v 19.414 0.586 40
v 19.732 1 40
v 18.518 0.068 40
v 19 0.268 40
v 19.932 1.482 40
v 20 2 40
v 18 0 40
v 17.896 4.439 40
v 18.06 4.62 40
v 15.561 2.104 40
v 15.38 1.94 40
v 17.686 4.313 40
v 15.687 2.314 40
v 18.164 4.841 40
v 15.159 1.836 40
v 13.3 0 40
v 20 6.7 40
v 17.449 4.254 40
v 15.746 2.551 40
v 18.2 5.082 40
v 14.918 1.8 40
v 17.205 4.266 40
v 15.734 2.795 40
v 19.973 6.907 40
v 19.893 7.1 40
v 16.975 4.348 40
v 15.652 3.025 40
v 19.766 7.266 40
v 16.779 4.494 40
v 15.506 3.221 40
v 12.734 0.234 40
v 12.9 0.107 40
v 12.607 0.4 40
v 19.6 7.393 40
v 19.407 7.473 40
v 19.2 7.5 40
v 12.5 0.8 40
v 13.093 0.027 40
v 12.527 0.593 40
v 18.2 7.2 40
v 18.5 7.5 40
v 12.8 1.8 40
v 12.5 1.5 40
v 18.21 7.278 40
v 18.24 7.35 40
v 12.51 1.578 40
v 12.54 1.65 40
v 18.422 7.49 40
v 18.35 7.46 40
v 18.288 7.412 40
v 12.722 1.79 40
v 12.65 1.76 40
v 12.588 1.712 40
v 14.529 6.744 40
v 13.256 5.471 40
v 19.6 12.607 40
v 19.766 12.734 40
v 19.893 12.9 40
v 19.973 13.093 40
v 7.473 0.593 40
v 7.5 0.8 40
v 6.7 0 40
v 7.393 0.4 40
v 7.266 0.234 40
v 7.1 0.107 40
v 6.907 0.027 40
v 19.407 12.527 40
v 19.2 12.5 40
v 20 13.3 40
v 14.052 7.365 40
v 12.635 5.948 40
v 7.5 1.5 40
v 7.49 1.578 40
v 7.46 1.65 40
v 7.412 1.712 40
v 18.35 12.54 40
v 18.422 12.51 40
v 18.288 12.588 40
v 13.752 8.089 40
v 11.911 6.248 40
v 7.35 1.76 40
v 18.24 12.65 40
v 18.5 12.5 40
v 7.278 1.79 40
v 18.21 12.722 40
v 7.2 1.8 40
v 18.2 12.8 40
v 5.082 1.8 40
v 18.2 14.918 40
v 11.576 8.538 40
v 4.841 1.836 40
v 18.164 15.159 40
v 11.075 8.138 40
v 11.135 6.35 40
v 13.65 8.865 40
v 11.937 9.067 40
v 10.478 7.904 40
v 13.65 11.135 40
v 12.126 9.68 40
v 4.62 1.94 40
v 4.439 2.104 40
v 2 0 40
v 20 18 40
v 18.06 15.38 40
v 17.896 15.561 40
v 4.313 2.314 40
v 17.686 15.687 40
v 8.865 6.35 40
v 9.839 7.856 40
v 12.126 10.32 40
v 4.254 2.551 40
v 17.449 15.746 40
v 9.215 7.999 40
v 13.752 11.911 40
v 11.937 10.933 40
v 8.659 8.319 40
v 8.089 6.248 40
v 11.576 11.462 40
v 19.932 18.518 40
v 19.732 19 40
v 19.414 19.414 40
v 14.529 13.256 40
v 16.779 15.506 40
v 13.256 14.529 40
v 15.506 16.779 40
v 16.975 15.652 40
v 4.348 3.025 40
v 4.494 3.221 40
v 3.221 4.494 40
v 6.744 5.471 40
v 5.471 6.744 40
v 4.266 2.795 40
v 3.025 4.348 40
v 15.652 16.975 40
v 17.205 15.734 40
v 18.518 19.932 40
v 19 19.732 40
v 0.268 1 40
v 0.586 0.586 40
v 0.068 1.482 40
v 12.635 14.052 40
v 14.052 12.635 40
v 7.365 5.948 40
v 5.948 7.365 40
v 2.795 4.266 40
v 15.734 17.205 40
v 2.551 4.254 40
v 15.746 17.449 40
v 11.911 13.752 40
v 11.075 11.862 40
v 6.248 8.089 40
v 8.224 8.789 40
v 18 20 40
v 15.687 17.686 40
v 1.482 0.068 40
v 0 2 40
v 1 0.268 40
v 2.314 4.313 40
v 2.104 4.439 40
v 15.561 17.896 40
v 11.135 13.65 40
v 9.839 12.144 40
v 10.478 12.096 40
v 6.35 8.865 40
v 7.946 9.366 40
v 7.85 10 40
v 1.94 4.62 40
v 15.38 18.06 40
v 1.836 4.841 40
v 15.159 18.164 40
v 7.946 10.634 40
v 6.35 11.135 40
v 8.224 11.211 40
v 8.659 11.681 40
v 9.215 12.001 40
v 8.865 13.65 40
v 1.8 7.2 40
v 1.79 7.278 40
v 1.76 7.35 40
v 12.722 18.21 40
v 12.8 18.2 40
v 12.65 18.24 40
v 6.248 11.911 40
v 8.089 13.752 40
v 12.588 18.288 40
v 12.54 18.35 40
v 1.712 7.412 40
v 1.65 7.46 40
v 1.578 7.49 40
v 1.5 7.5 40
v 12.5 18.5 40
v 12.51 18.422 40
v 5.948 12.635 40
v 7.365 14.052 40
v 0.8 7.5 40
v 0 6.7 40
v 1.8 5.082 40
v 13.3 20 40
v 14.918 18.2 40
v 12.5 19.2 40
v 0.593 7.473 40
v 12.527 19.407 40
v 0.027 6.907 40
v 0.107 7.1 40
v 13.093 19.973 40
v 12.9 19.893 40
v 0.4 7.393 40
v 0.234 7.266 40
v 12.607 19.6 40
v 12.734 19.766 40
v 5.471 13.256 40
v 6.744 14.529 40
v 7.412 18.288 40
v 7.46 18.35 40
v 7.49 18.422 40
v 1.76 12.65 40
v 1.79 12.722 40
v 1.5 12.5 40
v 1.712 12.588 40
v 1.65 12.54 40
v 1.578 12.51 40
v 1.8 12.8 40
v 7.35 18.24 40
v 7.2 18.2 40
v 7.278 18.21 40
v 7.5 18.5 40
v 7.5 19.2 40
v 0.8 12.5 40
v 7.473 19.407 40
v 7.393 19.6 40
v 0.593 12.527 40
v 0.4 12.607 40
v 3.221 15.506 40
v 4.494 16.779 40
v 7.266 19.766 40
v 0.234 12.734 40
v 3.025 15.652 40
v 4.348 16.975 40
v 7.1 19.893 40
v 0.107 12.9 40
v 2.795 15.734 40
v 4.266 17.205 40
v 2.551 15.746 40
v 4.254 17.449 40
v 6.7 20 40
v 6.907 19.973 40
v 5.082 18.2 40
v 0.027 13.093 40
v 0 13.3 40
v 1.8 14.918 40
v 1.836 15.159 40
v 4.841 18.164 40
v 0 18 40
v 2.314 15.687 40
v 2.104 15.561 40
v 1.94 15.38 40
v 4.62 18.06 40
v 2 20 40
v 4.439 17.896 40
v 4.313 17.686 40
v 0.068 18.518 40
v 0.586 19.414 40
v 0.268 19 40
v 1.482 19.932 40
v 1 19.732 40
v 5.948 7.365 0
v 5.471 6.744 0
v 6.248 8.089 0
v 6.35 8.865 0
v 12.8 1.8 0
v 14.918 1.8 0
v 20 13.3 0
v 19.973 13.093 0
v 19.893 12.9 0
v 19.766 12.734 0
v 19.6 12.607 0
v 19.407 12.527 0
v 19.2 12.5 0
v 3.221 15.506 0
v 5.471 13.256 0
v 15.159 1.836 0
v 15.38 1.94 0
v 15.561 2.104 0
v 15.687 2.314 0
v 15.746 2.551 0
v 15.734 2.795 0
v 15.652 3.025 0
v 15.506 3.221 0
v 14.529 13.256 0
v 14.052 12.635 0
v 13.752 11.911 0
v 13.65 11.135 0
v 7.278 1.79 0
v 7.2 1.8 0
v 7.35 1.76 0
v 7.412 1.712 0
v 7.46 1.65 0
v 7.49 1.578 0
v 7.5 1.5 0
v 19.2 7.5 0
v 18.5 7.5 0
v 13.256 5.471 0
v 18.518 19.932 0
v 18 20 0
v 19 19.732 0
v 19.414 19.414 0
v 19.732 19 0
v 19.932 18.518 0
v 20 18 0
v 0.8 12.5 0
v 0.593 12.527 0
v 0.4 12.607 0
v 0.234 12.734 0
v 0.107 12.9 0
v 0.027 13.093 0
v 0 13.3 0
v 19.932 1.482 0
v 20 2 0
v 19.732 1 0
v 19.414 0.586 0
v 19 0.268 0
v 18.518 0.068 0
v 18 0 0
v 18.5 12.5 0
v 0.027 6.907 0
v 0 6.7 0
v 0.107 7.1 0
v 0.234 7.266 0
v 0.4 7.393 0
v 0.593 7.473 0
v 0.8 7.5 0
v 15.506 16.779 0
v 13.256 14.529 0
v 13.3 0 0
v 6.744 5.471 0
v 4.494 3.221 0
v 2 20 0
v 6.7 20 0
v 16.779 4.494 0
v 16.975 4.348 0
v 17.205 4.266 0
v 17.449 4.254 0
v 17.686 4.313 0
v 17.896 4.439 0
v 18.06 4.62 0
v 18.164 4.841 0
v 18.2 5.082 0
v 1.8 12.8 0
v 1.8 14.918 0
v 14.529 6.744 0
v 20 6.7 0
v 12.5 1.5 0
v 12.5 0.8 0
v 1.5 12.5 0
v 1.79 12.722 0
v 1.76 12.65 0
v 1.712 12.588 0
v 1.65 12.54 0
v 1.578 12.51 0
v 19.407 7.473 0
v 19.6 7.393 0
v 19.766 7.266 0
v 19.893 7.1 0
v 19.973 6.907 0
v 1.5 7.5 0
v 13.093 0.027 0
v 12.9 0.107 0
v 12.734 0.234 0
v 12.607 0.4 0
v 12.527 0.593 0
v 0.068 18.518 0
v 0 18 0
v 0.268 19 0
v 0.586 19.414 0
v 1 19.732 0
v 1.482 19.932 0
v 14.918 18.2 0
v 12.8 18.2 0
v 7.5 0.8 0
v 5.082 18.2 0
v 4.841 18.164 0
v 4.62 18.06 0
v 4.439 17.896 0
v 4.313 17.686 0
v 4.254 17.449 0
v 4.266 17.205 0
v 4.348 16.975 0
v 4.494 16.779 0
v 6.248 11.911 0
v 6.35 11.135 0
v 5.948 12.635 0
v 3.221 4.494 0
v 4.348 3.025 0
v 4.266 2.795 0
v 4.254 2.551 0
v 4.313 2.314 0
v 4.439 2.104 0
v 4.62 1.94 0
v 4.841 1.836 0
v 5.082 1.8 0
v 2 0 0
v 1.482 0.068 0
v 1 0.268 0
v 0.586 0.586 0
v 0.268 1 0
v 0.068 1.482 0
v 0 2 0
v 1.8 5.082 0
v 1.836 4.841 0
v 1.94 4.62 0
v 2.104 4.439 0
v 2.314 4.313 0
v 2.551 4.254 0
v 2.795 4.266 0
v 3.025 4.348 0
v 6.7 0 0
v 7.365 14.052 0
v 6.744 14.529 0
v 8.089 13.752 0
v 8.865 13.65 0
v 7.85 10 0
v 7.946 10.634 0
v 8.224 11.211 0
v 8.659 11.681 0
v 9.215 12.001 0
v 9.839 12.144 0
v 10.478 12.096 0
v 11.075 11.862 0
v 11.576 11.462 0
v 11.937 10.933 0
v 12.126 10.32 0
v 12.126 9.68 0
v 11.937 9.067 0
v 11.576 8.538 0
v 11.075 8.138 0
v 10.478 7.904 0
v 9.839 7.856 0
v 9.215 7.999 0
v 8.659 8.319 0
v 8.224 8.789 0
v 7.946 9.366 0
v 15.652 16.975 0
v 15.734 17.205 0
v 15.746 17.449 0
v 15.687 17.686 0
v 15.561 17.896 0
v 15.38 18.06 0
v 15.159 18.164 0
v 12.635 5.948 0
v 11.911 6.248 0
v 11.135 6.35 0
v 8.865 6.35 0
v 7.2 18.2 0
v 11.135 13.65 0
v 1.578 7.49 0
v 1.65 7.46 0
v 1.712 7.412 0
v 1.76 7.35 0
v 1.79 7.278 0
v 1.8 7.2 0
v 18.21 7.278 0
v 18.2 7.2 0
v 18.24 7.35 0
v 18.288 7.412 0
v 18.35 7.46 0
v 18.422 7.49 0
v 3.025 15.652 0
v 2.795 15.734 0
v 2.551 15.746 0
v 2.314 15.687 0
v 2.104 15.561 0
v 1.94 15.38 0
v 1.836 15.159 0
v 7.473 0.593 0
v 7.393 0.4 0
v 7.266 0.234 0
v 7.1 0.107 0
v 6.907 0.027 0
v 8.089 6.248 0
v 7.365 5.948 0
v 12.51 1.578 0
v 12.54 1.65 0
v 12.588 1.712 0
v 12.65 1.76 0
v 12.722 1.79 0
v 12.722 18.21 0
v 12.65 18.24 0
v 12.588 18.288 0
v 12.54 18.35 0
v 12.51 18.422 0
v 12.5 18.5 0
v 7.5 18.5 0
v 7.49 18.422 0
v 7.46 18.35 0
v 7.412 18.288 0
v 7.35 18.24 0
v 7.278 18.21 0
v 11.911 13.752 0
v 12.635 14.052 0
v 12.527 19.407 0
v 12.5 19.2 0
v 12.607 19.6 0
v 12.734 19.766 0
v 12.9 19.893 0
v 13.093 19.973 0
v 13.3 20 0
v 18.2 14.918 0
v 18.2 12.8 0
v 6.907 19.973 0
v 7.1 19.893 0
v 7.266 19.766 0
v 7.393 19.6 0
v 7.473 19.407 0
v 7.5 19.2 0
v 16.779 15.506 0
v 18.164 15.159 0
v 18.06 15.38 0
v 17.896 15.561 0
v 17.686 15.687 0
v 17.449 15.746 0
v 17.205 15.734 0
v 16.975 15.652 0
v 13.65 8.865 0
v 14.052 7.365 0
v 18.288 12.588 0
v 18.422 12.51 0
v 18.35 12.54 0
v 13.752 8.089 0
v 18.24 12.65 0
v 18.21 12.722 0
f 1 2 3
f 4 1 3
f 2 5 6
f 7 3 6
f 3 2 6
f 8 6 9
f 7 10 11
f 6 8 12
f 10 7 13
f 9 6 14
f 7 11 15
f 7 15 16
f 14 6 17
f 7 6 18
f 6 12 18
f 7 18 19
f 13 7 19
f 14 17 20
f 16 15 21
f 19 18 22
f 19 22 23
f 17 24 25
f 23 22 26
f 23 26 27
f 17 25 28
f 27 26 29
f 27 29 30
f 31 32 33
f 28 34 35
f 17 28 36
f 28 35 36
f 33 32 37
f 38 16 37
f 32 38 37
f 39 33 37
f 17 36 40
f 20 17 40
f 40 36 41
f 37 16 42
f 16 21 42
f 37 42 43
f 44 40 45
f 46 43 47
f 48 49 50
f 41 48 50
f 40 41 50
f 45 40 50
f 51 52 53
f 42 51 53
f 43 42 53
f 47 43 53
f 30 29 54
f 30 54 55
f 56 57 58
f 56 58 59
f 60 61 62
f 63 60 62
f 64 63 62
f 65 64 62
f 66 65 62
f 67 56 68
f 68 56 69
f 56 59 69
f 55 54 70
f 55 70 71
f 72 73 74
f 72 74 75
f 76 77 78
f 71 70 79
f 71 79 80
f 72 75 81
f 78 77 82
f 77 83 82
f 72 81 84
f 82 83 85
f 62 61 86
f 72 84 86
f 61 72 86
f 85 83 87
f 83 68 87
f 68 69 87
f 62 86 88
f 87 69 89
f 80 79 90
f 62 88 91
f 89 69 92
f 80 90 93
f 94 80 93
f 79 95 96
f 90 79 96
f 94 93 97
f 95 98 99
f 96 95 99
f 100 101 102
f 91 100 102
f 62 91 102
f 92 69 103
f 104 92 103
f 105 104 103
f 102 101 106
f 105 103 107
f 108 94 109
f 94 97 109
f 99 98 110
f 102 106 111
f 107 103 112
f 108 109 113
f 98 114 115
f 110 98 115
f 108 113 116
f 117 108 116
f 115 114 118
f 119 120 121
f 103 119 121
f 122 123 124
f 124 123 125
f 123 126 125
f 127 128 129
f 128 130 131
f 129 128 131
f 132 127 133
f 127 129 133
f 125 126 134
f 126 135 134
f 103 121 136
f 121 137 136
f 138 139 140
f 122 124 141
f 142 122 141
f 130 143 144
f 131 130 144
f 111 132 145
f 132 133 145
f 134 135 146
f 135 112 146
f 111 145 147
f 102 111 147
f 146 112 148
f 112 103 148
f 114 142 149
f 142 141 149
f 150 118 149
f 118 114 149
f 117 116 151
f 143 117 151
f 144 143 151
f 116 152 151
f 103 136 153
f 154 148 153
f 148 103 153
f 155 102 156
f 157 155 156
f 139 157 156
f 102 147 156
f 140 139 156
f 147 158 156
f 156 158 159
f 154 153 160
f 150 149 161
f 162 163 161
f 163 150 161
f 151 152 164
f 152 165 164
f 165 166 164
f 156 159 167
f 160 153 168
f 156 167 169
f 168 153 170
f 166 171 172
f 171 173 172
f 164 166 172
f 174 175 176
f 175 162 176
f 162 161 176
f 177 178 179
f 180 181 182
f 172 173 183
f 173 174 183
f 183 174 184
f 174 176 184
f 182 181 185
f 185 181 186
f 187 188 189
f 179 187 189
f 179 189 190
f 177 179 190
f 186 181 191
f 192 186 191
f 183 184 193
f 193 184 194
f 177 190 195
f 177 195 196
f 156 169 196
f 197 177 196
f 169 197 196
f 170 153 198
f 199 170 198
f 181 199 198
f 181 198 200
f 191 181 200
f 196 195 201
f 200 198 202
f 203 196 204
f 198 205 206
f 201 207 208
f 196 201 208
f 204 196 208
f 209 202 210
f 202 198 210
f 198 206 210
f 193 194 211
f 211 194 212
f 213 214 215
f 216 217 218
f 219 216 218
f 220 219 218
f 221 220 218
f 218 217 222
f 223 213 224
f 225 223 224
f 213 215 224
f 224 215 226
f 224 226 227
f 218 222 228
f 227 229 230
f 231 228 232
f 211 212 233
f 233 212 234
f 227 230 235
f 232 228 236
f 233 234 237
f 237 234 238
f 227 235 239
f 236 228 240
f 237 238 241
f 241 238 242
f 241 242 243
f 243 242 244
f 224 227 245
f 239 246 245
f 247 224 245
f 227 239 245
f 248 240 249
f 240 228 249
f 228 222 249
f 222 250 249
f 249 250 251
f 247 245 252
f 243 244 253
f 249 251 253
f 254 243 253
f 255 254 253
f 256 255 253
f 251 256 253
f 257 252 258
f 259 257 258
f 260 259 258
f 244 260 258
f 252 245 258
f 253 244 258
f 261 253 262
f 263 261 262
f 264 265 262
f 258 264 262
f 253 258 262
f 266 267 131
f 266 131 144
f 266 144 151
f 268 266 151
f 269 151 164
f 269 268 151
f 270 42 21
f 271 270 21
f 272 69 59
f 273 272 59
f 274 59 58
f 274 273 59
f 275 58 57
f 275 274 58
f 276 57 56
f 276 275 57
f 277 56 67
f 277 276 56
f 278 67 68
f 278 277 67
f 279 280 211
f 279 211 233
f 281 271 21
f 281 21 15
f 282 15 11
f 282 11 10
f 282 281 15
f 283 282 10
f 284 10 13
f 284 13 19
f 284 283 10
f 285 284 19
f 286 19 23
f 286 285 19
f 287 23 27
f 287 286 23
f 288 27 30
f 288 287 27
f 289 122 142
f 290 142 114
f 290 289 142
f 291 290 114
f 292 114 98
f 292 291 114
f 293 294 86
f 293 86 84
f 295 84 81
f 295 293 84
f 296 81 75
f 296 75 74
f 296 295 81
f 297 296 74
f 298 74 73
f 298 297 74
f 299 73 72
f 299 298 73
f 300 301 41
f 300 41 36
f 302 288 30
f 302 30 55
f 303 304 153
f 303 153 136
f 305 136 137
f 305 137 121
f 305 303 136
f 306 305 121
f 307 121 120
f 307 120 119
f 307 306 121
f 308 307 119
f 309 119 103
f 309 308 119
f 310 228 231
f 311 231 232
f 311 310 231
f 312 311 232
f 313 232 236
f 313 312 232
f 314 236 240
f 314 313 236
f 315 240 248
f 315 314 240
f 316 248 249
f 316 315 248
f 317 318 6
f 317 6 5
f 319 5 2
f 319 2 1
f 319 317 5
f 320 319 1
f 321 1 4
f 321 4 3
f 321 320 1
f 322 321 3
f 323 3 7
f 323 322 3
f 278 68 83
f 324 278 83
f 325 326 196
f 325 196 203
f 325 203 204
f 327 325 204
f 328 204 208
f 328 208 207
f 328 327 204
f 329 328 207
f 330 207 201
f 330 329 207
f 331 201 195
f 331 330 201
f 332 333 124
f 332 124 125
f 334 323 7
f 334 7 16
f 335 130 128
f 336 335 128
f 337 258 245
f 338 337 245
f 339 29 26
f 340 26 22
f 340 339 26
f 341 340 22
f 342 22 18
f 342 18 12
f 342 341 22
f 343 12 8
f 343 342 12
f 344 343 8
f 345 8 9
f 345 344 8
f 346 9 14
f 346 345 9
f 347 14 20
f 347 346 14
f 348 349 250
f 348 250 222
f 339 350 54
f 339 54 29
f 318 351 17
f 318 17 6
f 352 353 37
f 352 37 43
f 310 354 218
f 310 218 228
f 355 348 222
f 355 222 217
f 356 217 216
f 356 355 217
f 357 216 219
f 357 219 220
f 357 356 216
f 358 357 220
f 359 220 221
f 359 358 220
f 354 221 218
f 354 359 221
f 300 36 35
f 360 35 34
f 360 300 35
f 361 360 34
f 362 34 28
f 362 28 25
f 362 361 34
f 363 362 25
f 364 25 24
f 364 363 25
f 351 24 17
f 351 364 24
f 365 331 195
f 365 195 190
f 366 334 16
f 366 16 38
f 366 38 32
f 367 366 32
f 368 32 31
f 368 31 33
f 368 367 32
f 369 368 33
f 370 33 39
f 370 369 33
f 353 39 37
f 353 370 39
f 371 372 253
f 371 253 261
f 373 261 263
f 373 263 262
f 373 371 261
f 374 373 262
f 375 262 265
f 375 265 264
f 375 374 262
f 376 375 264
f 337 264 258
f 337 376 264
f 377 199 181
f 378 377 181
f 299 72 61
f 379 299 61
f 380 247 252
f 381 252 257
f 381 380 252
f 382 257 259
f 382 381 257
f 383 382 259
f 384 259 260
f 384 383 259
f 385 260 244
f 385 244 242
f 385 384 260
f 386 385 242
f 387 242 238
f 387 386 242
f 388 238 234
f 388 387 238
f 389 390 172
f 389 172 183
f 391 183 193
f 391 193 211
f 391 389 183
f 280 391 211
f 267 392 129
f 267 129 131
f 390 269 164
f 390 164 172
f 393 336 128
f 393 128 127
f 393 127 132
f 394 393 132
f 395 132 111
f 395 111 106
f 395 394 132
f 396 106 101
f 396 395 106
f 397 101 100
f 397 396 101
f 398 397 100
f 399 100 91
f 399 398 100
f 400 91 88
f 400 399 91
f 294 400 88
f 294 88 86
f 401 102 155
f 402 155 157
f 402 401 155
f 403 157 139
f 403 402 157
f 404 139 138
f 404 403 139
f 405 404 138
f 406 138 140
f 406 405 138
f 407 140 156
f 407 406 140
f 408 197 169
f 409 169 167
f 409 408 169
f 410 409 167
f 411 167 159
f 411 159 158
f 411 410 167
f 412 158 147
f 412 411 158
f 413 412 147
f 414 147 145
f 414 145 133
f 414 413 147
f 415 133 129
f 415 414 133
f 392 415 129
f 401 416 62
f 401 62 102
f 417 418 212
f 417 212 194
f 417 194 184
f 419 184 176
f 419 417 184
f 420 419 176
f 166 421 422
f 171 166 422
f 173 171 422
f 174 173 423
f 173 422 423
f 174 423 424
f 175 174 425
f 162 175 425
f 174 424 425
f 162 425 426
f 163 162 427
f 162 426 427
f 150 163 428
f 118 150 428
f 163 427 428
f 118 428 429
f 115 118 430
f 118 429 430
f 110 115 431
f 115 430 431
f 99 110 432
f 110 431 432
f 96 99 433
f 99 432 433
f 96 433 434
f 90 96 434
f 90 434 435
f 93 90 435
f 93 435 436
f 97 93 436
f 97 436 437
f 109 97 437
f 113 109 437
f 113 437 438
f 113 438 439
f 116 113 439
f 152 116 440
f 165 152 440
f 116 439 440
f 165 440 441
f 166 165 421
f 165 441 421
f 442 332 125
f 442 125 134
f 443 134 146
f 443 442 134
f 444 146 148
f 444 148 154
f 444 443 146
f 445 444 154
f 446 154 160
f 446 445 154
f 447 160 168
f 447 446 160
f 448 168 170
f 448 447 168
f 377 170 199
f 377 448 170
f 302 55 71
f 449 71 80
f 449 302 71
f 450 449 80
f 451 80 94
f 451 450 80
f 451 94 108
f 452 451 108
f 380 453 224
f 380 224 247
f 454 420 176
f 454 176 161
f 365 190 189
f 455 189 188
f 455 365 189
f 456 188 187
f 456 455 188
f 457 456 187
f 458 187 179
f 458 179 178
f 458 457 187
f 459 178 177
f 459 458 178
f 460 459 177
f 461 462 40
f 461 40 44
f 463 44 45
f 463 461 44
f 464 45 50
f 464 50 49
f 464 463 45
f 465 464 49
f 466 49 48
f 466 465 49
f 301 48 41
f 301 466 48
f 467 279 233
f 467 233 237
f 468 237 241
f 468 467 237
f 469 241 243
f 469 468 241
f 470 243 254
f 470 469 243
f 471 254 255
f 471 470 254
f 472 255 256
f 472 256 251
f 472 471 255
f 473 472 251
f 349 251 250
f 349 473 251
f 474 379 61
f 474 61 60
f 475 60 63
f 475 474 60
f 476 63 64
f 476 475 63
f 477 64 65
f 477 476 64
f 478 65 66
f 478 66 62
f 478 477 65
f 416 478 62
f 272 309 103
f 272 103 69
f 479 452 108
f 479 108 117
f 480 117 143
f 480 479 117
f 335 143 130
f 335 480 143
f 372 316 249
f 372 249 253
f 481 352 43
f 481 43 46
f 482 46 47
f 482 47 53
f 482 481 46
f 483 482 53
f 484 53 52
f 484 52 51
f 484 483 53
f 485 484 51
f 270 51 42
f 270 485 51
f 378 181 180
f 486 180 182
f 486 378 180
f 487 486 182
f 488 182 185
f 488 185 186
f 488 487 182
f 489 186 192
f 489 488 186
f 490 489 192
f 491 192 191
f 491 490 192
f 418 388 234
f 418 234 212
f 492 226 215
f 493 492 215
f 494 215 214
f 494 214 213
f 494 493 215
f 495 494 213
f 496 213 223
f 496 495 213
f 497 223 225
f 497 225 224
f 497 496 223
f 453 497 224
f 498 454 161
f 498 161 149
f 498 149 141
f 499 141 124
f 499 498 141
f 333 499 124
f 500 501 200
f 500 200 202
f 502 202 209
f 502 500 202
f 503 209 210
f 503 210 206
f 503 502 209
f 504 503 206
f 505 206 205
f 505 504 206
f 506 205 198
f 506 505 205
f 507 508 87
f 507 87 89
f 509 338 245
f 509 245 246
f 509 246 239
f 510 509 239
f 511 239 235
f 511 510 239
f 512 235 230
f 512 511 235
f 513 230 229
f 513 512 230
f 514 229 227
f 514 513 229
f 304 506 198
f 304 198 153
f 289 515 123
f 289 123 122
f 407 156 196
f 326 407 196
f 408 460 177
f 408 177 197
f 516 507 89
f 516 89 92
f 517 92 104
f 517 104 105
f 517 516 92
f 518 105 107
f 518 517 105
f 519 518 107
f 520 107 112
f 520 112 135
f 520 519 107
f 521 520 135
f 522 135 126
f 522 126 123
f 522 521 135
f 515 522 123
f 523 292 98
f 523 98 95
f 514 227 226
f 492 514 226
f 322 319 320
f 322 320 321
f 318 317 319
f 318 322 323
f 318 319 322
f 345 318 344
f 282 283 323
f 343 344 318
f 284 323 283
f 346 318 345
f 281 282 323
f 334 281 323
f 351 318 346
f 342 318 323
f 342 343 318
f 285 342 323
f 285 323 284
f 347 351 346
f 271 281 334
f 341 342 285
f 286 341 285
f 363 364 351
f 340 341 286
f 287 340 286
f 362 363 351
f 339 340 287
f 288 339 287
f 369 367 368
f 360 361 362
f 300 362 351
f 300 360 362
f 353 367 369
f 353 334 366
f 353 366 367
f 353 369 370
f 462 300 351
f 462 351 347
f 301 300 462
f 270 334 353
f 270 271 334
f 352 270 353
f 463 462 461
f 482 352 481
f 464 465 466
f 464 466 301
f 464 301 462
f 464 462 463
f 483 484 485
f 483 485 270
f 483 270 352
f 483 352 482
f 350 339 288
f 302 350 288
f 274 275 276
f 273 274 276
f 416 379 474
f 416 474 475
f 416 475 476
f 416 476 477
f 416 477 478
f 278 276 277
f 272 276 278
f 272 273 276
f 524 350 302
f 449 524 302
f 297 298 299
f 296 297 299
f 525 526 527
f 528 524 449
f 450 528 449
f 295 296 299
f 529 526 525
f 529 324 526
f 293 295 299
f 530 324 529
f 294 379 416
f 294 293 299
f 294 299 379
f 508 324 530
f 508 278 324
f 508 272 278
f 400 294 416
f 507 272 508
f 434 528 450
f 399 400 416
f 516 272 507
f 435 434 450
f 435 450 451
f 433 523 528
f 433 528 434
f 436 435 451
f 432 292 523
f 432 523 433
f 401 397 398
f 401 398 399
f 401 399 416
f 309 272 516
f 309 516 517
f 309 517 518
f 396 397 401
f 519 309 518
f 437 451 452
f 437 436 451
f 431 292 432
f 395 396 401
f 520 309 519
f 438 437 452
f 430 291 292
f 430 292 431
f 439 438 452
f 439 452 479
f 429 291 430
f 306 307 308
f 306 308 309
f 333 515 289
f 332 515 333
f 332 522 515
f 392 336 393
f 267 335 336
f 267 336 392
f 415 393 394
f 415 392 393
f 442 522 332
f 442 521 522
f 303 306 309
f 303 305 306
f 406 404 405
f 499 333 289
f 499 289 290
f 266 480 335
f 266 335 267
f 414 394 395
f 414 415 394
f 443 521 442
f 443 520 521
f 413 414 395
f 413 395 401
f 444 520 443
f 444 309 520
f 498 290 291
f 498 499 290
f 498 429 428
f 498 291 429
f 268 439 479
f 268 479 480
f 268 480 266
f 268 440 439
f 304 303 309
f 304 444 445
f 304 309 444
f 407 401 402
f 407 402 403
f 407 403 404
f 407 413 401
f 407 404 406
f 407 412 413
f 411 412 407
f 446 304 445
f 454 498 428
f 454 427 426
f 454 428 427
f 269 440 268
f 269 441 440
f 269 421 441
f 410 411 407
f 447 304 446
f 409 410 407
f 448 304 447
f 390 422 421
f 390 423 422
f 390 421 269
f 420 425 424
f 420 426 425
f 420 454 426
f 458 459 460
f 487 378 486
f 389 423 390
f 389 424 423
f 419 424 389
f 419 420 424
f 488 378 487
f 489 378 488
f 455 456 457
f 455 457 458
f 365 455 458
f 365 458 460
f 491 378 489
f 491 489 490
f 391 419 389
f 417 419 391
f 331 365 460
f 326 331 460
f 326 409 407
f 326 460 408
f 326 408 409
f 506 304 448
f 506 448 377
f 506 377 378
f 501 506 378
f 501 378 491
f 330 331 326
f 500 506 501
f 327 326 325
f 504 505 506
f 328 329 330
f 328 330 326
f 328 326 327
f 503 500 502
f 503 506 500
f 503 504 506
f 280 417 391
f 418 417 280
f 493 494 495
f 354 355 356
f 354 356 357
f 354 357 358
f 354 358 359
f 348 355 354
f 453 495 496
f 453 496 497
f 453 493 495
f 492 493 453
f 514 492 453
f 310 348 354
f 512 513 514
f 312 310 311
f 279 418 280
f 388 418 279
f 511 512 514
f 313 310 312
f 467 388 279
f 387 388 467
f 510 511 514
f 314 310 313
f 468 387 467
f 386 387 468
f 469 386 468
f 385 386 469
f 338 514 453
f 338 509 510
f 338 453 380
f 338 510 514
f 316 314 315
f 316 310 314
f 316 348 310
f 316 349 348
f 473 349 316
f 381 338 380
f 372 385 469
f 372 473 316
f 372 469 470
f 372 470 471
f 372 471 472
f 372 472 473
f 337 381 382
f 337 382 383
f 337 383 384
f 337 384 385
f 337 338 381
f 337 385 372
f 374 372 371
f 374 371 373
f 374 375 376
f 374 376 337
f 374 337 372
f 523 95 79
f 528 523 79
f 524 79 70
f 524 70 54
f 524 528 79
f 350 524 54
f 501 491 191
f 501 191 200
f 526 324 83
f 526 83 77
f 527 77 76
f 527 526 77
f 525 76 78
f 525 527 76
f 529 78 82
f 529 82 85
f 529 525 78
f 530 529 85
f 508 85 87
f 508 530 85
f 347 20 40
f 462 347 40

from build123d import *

# Parameters (mm, degrees)
SKETCH1_R           = 2.15
BOSS_EXTRUDE1_DEPTH = 40


with BuildPart() as part:
    # Sketch1 → Boss-Extrude1 (new body)
    with BuildSketch(Plane(origin=(0, 0, 0), x_dir=(-1, 0, 0), z_dir=(0, 0, -1))):
        with BuildLine():
            Line((-12.499999997, 0.800000003), (-12.499999998, 1.500000003))
            ThreePointArc((-12.499999998, 1.500000003), (-12.587867964, 1.712132039), (-12.8, 1.800000005))
            Line((-12.8, 1.800000005), (-14.9175884, 1.800000005))
            ThreePointArc((-14.9175884, 1.800000005), (-15.686636445, 2.313861481), (-15.506192291, 3.221015502))
            Line((-15.506192291, 3.221015502), (-13.255887451, 5.471320342))
            ThreePointArc((-13.255887451, 5.471320342), (-12.282617405, 6.121638595), (-11.134567109, 6.349999998))
            Line((-11.134567109, 6.349999998), (-8.865432906, 6.349999998))
            ThreePointArc((-8.865432906, 6.349999998), (-7.717382611, 6.121638596), (-6.744112565, 5.471320342))
            Line((-6.744112565, 5.471320342), (-4.493807727, 3.221015504))
            ThreePointArc((-4.493807727, 3.221015504), (-4.313363573, 2.313861481), (-5.082411619, 1.800000005))
            Line((-5.082411619, 1.800000005), (-7.20000001, 1.800000005))
            ThreePointArc((-7.20000001, 1.800000005), (-7.412132045, 1.71213204), (-7.50000001, 1.500000005))
            Line((-7.50000001, 1.500000005), (-7.50000001, 0.8))
            ThreePointArc((-7.50000001, 0.8), (-7.265685435, 0.234314575), (-6.70000001, 0))
            Line((-6.70000001, 0), (-2, 0))
            ThreePointArc((-2, 0), (-0.585786438, 0.585786438), (0, 2))
            Line((0, 2), (0, 6.699999998))
            ThreePointArc((0, 6.699999998), (-0.234314576, 7.265685424), (-0.800000003, 7.5))
            Line((-0.800000003, 7.5), (-1.500000007, 7.5))
            ThreePointArc((-1.500000007, 7.5), (-1.712132044, 7.412132033), (-1.80000001, 7.199999997))
            Line((-1.80000001, 7.199999997), (-1.80000001, 5.082411604))
            ThreePointArc((-1.80000001, 5.082411604), (-2.313861485, 4.313363559), (-3.221015507, 4.493807713))
            Line((-3.221015507, 4.493807713), (-5.471320347, 6.744112553))
            ThreePointArc((-5.471320347, 6.744112553), (-6.1216386, 7.717382599), (-6.350000003, 8.865432896))
            Line((-6.350000003, 8.865432896), (-6.350000003, 11.134567105))
            ThreePointArc((-6.350000003, 11.134567105), (-6.121638601, 12.2826174), (-5.471320347, 13.255887446))
            Line((-5.471320347, 13.255887446), (-3.221015511, 15.506192282))
            ThreePointArc((-3.221015511, 15.506192282), (-2.313861487, 15.686636436), (-1.80000001, 14.917588389))
            Line((-1.80000001, 14.917588389), (-1.80000001, 12.799999998))
            ThreePointArc((-1.80000001, 12.799999998), (-1.712132045, 12.587867963), (-1.50000001, 12.499999997))
            Line((-1.50000001, 12.499999997), (-0.8, 12.499999997))
            ThreePointArc((-0.8, 12.499999997), (-0.234314575, 12.734314573), (0, 13.299999998))
            Line((0, 13.299999998), (0, 18))
            ThreePointArc((0, 18), (-0.585786438, 19.414213562), (-2, 20))
            Line((-2, 20), (-6.700000008, 20))
            ThreePointArc((-6.700000008, 20), (-7.265685435, 19.765685424), (-7.50000001, 19.199999998))
            Line((-7.50000001, 19.199999998), (-7.50000001, 18.500000005))
            ThreePointArc((-7.50000001, 18.500000005), (-7.412132044, 18.287867969), (-7.200000008, 18.200000003))
            Line((-7.200000008, 18.200000003), (-5.082411595, 18.200000003))
            ThreePointArc((-5.082411595, 18.200000003), (-4.313363547, 17.686138525), (-4.493807702, 16.7789845))
            Line((-4.493807702, 16.7789845), (-6.744112543, 14.528679659))
            ThreePointArc((-6.744112543, 14.528679659), (-7.717382589, 13.878361405), (-8.865432885, 13.650000003))
            Line((-8.865432885, 13.650000003), (-11.134567111, 13.650000003))
            ThreePointArc((-11.134567111, 13.650000003), (-12.282617406, 13.878361405), (-13.255887452, 14.528679658))
            Line((-13.255887452, 14.528679658), (-15.506192292, 16.778984498))
            ThreePointArc((-15.506192292, 16.778984498), (-15.686636447, 17.686138525), (-14.917588397, 18.200000002))
            Line((-14.917588397, 18.200000002), (-12.799999998, 18.200000003))
            ThreePointArc((-12.799999998, 18.200000003), (-12.587867963, 18.287867968), (-12.499999997, 18.500000002))
            Line((-12.499999997, 18.500000002), (-12.499999997, 19.2))
            ThreePointArc((-12.499999997, 19.2), (-12.734314573, 19.765685425), (-13.299999998, 20))
            Line((-13.299999998, 20), (-18, 20))
            ThreePointArc((-18, 20), (-19.414213562, 19.414213562), (-20, 18))
            Line((-20, 18), (-20, 13.3))
            ThreePointArc((-20, 13.3), (-19.765685424, 12.734314573), (-19.199999998, 12.499999997))
            Line((-19.199999998, 12.499999997), (-18.500000003, 12.499999997))
            ThreePointArc((-18.500000003, 12.499999997), (-18.287867967, 12.587867964), (-18.2, 12.8))
            Line((-18.2, 12.8), (-18.2, 14.91758839))
            ThreePointArc((-18.2, 14.91758839), (-17.686138525, 15.686636435), (-16.778984504, 15.506192281))
            Line((-16.778984504, 15.506192281), (-14.528679657, 13.255887434))
            ThreePointArc((-14.528679657, 13.255887434), (-13.878361403, 12.282617388), (-13.65, 11.134567091))
            Line((-13.65, 11.134567091), (-13.65, 8.865432887))
            ThreePointArc((-13.65, 8.865432887), (-13.878361403, 7.717382591), (-14.528679656, 6.744112546))
            Line((-14.528679656, 6.744112546), (-16.778984496, 4.493807706))
            ThreePointArc((-16.778984496, 4.493807706), (-17.686138522, 4.313363551), (-18.2, 5.0824116))
            Line((-18.2, 5.0824116), (-18.2, 7.2))
            ThreePointArc((-18.2, 7.2), (-18.287867966, 7.412132034), (-18.5, 7.5))
            Line((-18.5, 7.5), (-19.2, 7.5))
            ThreePointArc((-19.2, 7.5), (-19.765685425, 7.265685425), (-20, 6.7))
            Line((-20, 6.7), (-20, 2))
            ThreePointArc((-20, 2), (-19.414213562, 0.585786438), (-18, 0))
            Line((-18, 0), (-13.3, 0))
            ThreePointArc((-13.3, 0), (-12.734314573, 0.234314576), (-12.499999997, 0.800000003))
        make_face()
        with Locations((-10, 10)):
            Circle(SKETCH1_R, mode=Mode.SUBTRACT)
    extrude(amount=-BOSS_EXTRUDE1_DEPTH)


solid = part.part
